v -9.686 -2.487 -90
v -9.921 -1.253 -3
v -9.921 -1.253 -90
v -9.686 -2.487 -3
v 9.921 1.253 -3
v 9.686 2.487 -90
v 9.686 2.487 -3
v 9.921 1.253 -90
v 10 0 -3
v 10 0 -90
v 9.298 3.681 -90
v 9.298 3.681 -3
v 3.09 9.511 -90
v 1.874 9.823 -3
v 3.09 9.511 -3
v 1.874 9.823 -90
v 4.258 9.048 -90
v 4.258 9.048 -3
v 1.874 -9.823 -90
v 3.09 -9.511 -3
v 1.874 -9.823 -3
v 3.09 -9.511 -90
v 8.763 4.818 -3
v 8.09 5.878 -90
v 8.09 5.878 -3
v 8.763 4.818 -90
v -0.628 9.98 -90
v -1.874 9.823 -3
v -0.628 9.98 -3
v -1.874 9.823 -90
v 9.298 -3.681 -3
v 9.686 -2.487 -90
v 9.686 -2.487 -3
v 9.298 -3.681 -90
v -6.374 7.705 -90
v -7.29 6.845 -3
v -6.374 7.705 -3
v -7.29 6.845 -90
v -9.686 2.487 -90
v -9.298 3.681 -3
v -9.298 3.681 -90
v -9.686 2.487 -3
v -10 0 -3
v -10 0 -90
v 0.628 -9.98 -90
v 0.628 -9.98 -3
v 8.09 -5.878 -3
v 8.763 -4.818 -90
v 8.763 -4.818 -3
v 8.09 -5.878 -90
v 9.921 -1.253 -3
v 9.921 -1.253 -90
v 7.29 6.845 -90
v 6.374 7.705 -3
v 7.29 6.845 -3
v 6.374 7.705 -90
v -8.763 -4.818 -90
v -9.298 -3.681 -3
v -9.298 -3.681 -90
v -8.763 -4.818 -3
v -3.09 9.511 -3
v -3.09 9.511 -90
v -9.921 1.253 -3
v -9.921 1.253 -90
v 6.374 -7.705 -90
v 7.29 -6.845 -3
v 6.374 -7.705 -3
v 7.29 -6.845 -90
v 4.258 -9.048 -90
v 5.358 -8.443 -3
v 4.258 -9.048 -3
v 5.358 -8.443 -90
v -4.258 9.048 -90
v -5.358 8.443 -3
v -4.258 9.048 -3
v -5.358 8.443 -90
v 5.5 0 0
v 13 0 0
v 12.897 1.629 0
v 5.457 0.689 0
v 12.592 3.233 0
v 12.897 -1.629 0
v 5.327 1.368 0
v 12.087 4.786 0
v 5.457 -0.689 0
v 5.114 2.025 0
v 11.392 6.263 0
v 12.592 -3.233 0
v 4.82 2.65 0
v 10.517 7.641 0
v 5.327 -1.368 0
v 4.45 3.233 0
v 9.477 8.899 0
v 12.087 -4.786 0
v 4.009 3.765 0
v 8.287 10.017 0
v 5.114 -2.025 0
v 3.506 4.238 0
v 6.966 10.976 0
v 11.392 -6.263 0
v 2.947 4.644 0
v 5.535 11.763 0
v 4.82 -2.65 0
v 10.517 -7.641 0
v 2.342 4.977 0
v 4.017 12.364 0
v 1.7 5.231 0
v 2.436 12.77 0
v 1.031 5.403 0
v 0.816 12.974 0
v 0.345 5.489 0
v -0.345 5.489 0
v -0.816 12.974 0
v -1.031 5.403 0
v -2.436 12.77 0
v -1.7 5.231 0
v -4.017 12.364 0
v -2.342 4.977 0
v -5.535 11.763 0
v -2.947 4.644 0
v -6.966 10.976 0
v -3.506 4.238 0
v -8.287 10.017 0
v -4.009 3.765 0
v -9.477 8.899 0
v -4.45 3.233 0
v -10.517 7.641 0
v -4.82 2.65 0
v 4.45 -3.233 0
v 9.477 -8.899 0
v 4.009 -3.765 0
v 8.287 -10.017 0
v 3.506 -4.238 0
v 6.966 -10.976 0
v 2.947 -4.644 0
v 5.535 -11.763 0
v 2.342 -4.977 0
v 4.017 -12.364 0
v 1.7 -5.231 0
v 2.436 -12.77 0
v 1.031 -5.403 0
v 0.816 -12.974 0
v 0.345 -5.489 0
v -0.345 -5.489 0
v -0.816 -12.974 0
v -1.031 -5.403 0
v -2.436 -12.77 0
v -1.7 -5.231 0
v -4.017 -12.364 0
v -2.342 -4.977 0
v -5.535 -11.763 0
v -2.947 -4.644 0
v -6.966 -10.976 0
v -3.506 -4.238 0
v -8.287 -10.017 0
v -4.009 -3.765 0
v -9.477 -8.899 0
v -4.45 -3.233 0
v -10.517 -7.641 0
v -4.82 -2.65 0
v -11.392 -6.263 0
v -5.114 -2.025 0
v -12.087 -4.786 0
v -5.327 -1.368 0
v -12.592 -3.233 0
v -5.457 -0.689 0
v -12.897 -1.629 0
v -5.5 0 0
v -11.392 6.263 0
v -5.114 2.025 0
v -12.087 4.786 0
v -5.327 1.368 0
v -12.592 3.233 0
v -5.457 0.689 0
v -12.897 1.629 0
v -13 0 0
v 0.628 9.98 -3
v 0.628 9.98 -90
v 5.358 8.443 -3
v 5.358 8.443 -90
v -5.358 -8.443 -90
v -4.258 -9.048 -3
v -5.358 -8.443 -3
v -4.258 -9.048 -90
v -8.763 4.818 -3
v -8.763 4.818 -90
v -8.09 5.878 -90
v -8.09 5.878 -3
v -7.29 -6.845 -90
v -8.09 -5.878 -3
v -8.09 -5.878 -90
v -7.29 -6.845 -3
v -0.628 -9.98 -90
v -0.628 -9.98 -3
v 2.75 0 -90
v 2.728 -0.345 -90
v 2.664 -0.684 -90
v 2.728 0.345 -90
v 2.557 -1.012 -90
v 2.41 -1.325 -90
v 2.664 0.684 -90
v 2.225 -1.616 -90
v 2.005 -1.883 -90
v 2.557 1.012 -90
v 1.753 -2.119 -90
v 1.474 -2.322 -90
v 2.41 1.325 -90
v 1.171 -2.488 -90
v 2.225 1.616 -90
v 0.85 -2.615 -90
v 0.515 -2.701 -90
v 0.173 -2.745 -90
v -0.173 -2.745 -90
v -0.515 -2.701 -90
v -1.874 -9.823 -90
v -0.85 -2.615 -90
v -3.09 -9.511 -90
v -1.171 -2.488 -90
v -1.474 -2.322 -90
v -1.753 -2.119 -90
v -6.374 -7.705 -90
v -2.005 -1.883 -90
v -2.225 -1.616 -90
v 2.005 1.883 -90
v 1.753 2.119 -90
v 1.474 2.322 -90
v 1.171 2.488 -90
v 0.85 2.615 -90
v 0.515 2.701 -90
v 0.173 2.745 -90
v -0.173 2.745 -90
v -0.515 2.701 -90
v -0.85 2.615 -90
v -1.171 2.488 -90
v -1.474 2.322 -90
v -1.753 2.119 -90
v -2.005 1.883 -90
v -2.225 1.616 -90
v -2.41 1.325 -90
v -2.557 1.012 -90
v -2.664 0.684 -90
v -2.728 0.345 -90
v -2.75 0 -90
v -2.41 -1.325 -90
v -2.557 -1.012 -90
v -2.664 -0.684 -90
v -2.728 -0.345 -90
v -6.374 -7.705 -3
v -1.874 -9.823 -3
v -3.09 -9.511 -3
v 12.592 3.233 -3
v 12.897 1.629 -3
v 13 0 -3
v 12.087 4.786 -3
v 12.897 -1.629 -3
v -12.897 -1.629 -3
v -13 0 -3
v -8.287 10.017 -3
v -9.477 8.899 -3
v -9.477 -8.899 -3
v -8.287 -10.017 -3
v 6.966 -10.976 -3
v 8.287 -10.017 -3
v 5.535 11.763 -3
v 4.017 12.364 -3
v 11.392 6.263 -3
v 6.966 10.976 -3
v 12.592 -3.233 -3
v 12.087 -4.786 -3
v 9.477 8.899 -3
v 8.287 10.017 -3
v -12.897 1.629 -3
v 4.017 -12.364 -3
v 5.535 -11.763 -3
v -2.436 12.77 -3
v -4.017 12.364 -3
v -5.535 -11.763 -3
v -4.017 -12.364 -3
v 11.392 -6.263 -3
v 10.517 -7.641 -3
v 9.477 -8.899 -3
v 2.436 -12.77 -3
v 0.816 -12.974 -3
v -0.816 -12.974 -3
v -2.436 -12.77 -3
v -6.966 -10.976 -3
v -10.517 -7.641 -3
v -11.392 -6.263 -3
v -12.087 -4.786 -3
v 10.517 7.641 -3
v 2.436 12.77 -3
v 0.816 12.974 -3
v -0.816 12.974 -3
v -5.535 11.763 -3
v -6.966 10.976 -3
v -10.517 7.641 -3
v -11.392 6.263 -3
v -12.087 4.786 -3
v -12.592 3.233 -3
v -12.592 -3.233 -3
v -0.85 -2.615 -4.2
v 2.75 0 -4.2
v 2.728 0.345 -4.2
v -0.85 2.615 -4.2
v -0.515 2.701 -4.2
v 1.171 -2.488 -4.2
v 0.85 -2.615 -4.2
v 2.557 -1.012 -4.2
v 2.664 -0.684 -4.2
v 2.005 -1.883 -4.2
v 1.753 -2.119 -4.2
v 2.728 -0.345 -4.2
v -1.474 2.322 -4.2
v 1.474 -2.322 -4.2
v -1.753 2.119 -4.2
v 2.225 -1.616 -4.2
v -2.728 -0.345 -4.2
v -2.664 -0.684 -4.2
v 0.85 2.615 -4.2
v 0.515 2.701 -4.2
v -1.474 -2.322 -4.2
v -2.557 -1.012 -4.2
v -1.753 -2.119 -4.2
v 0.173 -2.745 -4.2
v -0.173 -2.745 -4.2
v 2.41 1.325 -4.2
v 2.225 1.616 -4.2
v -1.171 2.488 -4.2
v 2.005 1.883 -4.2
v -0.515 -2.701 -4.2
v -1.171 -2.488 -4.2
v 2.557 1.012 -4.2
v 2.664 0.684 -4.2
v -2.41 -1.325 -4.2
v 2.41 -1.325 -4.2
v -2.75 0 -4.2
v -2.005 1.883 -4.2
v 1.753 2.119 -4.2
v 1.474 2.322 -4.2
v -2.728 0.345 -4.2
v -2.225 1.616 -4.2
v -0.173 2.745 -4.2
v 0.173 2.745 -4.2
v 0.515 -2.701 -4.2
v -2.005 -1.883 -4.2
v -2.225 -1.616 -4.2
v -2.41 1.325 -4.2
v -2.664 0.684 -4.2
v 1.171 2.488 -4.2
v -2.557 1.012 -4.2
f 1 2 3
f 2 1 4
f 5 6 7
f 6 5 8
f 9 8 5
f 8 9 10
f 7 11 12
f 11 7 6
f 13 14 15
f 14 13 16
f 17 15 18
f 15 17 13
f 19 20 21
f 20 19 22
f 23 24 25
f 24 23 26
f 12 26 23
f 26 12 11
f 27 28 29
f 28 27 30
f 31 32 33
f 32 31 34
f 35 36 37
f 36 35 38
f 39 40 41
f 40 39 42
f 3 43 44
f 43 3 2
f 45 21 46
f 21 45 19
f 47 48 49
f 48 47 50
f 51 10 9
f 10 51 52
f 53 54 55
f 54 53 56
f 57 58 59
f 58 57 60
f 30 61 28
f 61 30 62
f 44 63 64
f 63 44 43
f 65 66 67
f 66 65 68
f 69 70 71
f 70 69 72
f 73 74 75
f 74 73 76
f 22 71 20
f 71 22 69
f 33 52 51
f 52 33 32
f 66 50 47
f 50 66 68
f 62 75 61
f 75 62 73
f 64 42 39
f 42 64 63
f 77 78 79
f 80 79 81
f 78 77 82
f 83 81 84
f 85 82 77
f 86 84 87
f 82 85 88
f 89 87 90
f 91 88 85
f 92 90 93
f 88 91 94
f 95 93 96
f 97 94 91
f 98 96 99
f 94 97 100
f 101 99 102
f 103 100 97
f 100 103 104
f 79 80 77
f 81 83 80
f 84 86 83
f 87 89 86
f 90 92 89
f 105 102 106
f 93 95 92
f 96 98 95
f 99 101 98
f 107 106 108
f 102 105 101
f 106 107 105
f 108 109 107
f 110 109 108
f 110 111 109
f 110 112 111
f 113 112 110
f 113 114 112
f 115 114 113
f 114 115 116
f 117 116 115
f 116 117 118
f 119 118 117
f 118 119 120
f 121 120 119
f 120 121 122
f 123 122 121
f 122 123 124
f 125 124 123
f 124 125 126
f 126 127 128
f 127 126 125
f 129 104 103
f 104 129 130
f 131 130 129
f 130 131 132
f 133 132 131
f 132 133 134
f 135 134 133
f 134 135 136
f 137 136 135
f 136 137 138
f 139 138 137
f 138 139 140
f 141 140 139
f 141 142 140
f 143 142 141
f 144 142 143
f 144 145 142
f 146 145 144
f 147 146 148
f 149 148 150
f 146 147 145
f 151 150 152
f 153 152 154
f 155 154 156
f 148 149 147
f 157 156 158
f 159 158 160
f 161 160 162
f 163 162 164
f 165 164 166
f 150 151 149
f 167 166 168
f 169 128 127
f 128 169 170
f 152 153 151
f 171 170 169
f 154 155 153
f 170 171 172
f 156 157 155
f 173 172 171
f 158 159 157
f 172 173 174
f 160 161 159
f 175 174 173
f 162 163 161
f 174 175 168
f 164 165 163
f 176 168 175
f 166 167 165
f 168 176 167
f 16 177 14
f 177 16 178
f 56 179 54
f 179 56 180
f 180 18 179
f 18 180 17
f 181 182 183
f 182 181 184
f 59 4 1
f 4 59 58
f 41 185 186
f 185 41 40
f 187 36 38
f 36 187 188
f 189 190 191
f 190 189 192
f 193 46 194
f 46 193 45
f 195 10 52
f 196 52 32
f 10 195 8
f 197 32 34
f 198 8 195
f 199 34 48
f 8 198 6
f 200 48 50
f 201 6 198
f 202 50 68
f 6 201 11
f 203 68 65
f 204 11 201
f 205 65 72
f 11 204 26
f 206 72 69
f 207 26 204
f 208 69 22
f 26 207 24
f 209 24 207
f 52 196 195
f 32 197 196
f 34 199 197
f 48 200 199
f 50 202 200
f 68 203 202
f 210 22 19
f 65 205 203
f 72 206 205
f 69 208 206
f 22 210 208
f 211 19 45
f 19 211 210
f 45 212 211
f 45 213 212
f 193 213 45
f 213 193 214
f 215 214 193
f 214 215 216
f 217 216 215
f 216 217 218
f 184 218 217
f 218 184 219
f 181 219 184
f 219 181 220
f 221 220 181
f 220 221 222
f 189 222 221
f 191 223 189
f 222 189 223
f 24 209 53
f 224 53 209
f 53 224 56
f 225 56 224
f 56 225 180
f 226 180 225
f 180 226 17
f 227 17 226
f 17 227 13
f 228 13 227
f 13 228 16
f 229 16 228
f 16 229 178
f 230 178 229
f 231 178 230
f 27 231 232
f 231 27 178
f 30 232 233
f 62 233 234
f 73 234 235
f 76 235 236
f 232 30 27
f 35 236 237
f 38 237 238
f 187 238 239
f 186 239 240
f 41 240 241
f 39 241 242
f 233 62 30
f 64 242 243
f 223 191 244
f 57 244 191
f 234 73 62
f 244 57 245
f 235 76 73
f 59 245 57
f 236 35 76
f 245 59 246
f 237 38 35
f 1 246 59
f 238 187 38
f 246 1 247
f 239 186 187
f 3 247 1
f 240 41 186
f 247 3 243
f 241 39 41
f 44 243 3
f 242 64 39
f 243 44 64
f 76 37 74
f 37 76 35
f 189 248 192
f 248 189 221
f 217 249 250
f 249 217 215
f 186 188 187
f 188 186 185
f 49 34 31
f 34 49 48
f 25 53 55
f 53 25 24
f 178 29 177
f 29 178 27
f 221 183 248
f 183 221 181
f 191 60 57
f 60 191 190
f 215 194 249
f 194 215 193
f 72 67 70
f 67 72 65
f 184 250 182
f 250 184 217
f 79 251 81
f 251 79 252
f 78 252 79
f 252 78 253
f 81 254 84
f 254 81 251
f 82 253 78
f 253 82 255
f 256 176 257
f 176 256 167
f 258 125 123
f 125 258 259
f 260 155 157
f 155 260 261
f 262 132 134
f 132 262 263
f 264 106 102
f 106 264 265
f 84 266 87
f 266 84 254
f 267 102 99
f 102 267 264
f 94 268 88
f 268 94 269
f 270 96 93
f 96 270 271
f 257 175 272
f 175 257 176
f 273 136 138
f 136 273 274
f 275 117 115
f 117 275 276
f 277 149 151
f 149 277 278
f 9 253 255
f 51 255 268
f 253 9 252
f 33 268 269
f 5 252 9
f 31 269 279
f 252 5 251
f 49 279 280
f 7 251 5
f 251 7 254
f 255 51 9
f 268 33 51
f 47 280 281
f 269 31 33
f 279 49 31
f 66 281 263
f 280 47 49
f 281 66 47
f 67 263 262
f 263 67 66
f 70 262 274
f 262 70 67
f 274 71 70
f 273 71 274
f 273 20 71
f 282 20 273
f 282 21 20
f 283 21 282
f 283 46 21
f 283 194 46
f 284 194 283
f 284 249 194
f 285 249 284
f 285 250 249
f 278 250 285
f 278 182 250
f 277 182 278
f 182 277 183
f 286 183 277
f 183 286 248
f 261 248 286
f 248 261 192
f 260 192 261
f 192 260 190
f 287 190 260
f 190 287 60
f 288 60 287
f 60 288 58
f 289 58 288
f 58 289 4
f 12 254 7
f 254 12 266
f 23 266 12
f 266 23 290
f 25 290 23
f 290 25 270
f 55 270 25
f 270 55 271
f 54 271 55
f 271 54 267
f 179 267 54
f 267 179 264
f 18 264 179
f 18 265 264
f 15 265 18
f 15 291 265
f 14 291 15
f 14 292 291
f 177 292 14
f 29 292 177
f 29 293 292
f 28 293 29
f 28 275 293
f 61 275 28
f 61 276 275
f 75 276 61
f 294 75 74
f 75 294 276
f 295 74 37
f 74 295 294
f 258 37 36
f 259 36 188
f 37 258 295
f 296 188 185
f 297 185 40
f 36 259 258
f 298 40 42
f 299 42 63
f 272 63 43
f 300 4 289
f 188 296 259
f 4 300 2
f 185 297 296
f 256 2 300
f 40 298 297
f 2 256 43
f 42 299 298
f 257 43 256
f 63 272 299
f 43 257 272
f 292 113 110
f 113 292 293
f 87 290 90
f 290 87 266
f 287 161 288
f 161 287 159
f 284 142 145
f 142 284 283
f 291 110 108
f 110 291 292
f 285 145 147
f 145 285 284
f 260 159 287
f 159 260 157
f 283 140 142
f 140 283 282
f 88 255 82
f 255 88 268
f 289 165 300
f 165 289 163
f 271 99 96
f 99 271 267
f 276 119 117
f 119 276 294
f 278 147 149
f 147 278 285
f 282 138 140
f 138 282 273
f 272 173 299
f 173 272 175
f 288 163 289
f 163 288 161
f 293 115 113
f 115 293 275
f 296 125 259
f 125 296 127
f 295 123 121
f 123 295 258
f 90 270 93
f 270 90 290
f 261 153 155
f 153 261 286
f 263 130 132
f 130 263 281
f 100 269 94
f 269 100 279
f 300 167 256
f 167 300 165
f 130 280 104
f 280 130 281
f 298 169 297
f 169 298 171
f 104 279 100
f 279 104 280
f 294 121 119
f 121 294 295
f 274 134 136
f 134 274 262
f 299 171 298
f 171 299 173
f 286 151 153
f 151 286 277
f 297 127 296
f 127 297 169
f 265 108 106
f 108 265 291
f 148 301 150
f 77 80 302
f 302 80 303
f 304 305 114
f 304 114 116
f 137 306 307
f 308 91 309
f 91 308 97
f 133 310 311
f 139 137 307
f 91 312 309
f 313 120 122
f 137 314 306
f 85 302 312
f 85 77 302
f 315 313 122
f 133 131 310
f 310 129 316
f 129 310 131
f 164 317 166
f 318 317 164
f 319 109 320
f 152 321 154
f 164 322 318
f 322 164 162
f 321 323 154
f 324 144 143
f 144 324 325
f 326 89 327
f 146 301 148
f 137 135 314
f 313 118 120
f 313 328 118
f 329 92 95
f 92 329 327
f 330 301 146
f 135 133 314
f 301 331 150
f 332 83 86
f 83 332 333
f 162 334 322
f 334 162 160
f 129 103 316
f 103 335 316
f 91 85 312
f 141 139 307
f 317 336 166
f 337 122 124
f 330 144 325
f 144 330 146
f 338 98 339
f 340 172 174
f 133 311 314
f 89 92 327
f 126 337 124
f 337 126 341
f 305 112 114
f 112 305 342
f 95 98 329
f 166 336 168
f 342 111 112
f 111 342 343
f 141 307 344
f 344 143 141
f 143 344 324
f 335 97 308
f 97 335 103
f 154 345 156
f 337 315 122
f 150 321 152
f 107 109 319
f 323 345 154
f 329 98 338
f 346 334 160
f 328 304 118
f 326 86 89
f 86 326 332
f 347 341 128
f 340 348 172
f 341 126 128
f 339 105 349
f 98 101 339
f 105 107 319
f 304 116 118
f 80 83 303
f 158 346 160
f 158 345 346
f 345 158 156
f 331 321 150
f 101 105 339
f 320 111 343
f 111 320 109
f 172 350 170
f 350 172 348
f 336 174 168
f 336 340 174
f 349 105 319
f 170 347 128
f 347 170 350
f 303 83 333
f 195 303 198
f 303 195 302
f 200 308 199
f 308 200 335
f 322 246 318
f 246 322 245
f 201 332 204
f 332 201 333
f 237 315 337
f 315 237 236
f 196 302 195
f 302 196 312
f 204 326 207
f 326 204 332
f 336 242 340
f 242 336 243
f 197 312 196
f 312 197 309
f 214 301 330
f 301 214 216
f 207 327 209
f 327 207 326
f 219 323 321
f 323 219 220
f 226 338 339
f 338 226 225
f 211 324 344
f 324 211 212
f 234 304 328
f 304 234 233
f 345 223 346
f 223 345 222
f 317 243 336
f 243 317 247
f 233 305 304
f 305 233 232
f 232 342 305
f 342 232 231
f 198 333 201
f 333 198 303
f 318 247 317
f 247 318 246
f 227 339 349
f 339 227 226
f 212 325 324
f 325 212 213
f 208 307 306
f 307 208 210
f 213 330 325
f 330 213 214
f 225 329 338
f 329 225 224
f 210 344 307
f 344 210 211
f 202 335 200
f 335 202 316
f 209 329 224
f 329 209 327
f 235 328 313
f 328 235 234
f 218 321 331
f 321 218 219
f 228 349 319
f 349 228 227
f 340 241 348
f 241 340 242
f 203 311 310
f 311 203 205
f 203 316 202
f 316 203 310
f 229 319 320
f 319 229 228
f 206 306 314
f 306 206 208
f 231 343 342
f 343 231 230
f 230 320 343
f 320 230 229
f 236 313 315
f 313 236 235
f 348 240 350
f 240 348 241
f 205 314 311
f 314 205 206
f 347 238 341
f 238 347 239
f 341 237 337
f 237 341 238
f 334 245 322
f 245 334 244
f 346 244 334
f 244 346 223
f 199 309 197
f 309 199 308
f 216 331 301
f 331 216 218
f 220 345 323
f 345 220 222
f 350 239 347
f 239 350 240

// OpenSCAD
$fn = 50;


difference() {
	union() {
		translate(v = [0, 0, -90.0000000000]) {
			cylinder(h = 90, r = 10.0000000000);
		}
		translate(v = [0, 0, -3.0000000000]) {
			cylinder(h = 3, r = 13.0000000000);
		}
	}
	union() {
		translate(v = [0, 0, 0]) {
			rotate(a = [0, 0, 0]) {
				difference() {
					union() {
						#translate(v = [0, 0, -90.0000000000]) {
							cylinder(h = 90, r = 2.2500000000);
						}
						#translate(v = [0, 0, -4.2000000000]) {
							cylinder(h = 4.2000000000, r = 10.0000000000, r1 = 2.7500000000, r2 = 5.5000000000);
						}
						#translate(v = [0, 0, -90.0000000000]) {
							cylinder(h = 90, r = 2.7500000000);
						}
						#translate(v = [0, 0, -90.0000000000]) {
							cylinder(h = 90, r = 2.2500000000);
						}
					}
					union();
				}
			}
		}
	}
}
